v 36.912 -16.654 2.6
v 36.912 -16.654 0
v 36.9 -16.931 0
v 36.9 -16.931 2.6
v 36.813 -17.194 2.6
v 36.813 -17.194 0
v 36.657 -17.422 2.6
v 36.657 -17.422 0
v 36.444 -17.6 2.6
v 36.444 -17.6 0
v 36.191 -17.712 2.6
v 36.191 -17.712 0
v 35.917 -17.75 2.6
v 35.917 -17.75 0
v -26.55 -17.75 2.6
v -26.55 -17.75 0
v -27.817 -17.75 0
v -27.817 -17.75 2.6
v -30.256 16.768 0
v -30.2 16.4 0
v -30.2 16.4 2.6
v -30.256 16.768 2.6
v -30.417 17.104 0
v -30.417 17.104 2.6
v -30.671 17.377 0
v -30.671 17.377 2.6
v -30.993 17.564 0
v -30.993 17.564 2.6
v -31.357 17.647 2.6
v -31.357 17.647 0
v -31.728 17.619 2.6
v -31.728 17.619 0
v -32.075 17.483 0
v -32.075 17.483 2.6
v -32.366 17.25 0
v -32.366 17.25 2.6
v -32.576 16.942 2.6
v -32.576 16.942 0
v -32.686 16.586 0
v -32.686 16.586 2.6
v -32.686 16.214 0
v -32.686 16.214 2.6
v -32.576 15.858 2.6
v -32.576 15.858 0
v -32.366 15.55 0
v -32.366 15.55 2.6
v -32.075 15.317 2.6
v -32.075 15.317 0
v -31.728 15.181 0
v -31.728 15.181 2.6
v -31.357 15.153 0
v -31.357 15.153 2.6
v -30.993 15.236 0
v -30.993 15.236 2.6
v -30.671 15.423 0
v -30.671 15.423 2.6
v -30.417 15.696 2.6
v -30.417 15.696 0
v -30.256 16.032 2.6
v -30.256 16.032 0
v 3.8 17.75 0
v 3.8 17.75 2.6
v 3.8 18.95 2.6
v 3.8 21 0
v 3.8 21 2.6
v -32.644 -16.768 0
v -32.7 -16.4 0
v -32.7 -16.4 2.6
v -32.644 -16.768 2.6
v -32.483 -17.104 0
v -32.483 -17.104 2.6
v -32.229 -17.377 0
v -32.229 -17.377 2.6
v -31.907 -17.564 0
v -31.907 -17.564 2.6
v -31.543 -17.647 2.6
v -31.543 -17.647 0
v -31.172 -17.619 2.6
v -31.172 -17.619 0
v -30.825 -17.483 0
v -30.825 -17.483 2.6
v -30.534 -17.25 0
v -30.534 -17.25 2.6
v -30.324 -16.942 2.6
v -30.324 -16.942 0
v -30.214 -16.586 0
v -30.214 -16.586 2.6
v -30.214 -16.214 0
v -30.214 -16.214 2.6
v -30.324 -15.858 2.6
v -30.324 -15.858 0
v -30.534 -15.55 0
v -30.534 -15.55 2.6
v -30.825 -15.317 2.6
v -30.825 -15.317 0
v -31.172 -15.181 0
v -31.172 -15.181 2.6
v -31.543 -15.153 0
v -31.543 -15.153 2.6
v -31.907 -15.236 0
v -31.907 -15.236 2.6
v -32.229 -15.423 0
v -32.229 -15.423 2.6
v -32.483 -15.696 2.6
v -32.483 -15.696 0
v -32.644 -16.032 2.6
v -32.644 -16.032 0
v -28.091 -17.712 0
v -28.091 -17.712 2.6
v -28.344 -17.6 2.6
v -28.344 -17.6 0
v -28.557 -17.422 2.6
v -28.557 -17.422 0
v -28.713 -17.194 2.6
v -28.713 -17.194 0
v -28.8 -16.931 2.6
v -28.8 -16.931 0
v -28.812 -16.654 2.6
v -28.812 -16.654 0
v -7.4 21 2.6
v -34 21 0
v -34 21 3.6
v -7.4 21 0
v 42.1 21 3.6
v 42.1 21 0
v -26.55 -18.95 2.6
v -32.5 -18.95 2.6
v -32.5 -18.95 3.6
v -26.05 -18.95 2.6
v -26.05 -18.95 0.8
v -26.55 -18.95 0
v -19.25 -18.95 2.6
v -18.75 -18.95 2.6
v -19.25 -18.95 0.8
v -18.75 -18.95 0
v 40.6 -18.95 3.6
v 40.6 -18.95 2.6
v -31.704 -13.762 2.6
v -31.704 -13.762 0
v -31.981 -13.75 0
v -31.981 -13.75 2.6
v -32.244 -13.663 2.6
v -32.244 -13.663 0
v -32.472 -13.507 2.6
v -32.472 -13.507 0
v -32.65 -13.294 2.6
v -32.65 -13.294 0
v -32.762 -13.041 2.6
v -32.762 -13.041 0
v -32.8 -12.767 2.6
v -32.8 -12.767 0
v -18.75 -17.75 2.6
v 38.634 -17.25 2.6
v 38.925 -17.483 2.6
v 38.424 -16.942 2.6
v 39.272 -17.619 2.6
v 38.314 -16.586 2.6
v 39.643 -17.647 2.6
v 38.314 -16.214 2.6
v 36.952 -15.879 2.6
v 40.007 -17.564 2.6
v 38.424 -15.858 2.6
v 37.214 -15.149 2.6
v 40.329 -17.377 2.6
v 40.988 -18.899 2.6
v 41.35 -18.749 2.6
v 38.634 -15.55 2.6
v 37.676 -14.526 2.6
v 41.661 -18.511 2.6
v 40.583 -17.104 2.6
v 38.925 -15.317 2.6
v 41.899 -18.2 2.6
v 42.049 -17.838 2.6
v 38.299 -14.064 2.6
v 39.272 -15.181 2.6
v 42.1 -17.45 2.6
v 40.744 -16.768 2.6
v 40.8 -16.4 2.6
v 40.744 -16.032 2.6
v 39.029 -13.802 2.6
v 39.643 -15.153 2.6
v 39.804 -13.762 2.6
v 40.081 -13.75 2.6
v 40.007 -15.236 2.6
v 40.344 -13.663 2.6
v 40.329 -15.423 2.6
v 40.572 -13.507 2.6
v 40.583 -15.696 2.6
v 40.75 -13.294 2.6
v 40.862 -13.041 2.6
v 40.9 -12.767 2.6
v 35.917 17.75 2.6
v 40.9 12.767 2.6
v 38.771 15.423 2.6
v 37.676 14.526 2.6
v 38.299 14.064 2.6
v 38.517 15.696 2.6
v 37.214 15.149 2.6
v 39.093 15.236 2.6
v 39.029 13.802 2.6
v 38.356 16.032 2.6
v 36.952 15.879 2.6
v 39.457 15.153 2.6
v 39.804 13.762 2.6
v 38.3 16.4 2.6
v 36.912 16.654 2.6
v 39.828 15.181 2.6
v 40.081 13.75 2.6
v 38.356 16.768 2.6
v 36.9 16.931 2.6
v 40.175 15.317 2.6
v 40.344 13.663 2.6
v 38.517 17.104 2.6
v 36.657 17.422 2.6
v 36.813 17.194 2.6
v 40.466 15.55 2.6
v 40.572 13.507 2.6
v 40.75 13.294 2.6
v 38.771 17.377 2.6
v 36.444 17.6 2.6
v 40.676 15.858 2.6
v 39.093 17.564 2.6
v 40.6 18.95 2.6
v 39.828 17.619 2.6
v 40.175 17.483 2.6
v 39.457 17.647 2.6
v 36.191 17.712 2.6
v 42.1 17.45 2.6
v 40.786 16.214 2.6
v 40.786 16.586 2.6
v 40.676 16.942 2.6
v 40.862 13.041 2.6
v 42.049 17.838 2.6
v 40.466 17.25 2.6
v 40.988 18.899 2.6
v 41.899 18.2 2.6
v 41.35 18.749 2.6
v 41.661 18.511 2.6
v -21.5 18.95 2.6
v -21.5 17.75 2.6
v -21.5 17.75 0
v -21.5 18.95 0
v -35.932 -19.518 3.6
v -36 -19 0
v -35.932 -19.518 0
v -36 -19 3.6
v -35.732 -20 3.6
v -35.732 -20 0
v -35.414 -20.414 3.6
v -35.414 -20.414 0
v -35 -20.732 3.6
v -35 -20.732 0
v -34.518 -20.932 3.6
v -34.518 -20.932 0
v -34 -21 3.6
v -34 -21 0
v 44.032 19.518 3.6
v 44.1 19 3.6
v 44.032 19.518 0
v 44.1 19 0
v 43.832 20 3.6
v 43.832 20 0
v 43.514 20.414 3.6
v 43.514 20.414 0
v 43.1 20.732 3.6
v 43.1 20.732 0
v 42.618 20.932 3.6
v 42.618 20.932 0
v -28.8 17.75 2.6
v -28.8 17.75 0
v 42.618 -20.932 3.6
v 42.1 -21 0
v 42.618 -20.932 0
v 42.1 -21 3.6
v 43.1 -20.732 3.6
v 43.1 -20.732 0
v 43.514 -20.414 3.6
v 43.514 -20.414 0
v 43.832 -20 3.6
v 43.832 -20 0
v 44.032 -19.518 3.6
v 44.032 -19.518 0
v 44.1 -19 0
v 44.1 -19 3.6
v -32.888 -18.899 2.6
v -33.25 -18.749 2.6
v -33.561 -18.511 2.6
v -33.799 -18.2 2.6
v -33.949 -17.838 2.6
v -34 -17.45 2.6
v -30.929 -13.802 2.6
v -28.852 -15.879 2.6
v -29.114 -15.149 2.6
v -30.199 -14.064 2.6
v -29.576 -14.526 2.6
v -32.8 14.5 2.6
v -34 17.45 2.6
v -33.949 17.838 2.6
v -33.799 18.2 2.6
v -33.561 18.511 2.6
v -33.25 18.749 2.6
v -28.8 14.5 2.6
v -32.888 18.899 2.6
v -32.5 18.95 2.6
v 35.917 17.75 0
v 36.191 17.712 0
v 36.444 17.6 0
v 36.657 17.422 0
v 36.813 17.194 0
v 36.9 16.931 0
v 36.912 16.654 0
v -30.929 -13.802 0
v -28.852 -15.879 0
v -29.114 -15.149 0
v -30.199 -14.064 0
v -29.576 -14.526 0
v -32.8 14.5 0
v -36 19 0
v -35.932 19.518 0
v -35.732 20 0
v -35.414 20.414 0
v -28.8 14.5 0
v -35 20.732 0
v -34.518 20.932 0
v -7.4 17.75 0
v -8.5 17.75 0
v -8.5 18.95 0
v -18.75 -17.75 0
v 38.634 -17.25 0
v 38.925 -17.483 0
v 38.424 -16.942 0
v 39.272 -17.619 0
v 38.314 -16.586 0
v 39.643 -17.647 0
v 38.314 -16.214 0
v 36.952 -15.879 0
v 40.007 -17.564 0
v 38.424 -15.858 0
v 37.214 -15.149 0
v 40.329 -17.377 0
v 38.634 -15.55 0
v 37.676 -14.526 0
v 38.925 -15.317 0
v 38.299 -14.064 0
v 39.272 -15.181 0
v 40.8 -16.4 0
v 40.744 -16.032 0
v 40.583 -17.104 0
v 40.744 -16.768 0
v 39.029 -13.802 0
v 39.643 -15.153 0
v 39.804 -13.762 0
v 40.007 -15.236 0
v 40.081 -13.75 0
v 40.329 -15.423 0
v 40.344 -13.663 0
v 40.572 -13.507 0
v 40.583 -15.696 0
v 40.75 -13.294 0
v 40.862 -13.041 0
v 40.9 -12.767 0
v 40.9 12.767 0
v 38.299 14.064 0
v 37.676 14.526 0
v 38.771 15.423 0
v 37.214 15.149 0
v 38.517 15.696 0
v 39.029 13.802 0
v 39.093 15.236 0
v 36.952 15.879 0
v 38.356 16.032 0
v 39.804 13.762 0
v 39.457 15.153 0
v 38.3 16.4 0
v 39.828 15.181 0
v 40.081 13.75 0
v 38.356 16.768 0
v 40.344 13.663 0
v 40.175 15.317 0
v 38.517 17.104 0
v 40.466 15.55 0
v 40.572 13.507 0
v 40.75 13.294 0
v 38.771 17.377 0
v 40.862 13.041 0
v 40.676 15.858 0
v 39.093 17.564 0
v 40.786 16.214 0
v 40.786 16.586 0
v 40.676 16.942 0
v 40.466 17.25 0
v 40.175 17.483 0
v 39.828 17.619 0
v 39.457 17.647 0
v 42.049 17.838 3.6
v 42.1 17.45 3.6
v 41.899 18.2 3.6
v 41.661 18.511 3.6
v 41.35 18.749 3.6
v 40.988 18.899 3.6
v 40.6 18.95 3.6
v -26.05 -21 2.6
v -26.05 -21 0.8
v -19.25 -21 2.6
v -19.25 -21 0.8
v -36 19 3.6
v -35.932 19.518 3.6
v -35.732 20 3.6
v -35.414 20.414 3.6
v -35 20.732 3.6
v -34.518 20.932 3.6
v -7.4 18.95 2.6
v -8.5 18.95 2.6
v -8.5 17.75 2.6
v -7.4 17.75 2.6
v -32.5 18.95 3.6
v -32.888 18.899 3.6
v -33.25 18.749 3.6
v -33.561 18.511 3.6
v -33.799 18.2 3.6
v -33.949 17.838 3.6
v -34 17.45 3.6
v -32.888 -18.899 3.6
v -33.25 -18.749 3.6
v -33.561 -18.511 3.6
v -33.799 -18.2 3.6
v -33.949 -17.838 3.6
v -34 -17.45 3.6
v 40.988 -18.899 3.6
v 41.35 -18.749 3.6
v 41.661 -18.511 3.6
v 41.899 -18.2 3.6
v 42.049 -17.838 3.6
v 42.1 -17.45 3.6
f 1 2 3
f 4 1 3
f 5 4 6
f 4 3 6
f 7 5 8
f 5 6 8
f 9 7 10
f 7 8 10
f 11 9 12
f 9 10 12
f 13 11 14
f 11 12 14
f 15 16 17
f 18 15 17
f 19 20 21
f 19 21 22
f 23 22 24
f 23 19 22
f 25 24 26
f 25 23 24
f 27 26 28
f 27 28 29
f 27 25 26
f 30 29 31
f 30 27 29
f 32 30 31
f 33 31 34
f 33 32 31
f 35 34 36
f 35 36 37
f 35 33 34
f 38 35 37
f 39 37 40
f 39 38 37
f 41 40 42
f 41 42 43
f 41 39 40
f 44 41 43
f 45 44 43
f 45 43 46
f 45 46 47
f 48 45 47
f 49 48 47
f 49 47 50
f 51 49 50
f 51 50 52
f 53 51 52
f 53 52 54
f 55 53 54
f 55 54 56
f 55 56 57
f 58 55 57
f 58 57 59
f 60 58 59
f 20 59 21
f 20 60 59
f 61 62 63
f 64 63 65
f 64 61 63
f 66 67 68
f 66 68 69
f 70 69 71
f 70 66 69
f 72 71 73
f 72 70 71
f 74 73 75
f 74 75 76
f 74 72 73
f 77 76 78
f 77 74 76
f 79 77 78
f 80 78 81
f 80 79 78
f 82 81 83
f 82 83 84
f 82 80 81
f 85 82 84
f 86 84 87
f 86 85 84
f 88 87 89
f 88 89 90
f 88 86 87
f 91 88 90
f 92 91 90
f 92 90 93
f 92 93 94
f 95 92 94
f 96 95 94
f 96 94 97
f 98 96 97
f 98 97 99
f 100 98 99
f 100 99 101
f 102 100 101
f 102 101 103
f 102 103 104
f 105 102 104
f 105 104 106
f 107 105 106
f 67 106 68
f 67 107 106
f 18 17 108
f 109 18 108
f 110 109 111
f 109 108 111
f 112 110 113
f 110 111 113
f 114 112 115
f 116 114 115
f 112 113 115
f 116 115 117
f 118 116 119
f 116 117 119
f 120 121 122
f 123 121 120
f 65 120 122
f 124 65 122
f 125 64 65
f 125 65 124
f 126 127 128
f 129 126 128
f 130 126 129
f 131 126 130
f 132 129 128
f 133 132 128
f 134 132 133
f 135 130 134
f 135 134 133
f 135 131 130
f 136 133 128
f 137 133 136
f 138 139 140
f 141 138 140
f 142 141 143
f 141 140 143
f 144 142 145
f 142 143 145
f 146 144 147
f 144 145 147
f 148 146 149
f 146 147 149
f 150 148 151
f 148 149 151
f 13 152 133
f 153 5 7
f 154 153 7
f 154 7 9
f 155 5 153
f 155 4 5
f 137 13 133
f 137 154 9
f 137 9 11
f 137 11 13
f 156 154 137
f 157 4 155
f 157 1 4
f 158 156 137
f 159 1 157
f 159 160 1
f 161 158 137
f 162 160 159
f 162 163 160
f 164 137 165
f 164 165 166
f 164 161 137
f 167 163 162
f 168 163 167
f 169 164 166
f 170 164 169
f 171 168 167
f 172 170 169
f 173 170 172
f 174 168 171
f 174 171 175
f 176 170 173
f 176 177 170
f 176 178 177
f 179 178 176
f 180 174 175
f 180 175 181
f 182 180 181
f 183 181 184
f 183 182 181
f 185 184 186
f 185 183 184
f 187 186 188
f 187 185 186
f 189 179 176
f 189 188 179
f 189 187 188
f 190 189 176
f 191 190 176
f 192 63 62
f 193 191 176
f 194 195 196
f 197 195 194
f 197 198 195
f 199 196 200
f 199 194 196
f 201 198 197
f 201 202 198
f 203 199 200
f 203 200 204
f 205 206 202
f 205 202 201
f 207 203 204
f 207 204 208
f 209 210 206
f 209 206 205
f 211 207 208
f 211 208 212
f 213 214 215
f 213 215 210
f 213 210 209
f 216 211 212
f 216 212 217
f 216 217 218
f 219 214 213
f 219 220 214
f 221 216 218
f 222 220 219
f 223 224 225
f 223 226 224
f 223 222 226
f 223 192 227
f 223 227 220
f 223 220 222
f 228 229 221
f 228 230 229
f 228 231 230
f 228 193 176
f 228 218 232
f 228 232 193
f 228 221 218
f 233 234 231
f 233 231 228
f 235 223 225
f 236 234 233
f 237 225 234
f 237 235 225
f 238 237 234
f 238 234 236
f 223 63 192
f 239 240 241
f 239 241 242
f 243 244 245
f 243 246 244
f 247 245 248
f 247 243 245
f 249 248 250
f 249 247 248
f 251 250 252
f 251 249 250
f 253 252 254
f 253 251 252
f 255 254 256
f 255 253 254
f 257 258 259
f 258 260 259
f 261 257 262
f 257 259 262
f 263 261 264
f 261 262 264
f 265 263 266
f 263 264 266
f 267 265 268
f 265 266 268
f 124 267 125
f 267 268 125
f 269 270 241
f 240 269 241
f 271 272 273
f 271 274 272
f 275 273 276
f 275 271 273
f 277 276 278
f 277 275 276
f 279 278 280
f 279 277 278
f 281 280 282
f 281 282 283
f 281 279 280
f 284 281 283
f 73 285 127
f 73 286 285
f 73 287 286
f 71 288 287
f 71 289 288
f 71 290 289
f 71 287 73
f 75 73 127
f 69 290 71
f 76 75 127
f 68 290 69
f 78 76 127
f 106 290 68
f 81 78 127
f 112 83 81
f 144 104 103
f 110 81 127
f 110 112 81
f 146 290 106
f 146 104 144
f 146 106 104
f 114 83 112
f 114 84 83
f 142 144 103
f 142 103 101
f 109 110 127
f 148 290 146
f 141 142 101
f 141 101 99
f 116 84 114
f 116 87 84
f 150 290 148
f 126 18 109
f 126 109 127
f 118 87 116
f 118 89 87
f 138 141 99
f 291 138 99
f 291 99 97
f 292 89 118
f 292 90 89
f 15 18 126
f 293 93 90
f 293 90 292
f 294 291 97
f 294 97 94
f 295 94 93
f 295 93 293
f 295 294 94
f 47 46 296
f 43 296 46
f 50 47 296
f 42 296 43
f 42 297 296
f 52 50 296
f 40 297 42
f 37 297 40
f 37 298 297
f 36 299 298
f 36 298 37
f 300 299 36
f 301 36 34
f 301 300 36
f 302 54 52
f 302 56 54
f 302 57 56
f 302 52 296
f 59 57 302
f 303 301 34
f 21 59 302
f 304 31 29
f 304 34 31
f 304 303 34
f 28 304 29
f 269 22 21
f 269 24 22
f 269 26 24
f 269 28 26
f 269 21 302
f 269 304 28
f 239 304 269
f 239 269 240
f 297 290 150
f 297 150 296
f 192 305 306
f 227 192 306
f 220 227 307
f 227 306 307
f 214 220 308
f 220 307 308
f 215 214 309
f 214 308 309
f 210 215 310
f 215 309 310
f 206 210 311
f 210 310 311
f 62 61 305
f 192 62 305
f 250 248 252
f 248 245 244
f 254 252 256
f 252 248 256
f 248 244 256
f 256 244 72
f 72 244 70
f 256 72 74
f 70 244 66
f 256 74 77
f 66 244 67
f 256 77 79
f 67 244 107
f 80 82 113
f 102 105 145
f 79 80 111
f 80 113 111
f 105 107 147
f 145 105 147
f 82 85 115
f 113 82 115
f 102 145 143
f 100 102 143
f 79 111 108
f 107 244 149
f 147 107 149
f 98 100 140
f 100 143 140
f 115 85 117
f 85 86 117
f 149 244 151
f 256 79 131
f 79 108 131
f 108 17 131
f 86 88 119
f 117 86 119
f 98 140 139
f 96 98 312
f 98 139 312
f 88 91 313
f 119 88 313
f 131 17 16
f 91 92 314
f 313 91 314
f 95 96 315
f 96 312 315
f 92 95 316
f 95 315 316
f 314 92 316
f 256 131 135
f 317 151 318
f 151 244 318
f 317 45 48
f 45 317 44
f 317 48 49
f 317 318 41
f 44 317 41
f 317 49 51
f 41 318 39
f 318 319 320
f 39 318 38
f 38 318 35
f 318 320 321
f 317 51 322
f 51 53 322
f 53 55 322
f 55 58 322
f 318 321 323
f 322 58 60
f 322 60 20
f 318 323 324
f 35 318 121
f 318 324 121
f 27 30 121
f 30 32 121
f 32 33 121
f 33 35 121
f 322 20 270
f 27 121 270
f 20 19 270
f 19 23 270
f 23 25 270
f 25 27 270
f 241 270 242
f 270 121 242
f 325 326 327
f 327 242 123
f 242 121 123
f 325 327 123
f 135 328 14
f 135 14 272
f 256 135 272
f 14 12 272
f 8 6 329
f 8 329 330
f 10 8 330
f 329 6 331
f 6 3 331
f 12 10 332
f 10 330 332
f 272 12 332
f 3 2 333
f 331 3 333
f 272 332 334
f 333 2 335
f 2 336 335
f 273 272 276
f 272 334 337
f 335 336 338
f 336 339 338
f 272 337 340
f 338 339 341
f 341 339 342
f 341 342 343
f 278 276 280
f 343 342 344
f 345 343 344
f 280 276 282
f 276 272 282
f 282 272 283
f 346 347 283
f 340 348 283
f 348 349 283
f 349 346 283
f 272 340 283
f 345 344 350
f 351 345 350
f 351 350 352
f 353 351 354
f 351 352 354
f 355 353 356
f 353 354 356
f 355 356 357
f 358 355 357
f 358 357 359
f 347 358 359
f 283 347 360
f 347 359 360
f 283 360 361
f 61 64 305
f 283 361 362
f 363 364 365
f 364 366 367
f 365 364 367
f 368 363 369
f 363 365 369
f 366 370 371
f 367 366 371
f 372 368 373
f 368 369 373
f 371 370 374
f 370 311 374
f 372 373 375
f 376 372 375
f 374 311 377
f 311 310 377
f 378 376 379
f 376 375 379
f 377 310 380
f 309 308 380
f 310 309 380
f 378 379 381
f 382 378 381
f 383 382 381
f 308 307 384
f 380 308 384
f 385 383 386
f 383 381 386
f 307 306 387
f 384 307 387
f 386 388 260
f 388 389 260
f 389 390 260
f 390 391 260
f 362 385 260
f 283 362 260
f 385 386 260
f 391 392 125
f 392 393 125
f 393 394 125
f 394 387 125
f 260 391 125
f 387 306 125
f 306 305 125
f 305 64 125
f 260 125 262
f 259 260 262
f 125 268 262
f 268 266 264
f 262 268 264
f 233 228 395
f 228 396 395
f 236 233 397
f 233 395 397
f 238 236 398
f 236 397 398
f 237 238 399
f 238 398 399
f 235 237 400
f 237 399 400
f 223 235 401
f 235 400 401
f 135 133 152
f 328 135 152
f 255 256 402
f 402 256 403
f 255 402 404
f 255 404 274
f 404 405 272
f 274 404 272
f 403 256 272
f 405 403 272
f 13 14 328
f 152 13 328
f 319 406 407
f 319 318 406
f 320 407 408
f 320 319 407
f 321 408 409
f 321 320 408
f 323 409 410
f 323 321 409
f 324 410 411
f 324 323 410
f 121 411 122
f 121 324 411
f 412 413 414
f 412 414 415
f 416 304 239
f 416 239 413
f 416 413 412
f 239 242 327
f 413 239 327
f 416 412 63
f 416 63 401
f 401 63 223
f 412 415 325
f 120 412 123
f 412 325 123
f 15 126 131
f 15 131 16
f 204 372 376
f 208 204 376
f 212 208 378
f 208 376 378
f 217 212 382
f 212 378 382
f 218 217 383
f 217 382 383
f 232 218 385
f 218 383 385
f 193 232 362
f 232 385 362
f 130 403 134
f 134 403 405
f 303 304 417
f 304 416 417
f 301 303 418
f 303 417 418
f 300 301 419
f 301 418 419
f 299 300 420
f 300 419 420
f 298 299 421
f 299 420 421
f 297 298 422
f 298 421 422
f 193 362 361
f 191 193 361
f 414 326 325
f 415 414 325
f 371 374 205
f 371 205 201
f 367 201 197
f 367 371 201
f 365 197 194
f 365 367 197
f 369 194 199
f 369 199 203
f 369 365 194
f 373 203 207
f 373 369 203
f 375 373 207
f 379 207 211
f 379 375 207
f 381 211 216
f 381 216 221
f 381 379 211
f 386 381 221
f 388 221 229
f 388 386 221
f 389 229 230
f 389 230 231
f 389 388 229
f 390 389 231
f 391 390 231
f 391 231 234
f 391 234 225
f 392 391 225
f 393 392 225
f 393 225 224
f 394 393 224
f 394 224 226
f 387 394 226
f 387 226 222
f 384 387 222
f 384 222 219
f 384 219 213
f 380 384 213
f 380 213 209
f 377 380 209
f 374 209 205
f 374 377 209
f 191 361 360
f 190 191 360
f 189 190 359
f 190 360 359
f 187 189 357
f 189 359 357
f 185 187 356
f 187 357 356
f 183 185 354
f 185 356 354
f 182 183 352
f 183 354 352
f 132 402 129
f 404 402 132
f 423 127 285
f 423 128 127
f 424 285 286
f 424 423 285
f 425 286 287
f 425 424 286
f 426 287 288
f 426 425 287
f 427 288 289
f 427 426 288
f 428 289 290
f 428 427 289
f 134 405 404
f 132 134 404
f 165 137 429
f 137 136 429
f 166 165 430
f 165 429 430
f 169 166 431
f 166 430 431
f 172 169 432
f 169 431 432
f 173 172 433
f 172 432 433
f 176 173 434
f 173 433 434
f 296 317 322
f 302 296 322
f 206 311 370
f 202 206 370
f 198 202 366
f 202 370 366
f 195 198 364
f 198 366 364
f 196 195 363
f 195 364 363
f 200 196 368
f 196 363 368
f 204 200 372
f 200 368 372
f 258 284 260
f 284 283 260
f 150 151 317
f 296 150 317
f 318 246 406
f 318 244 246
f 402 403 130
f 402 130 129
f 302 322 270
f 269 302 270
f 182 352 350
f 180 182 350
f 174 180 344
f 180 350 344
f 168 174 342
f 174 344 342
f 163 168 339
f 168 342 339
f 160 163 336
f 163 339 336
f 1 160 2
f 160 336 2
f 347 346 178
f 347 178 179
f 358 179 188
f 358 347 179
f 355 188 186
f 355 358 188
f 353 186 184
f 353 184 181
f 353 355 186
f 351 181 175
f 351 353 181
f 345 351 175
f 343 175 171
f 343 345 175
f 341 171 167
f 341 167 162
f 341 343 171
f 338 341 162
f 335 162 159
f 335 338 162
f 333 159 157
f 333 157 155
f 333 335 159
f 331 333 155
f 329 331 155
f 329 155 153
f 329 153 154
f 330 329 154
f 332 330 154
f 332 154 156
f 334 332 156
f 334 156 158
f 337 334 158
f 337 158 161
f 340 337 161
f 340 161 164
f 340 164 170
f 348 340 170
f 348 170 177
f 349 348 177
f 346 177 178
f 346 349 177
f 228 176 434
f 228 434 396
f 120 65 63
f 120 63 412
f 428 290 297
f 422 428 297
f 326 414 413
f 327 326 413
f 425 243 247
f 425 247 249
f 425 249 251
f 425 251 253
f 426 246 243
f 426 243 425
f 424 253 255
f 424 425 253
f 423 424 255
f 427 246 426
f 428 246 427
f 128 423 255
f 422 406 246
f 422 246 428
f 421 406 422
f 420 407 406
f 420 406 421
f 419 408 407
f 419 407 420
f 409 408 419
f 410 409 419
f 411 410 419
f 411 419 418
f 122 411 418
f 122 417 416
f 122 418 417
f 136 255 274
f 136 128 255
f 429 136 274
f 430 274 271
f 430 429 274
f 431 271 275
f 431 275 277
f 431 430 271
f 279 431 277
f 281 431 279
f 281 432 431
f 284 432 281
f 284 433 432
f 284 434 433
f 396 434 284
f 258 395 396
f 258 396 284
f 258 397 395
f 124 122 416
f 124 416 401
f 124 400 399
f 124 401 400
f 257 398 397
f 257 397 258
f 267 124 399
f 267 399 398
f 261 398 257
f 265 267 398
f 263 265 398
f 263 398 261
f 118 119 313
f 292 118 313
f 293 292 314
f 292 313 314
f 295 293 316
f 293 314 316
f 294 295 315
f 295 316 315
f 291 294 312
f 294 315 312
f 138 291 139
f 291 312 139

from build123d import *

# Parameters (mm, degrees)
SKETCH1_W           = 80.1
SKETCH1_H           = 42
SKETCH1_R           = 1.25
BOSS_EXTRUDE1_DEPTH = 2.6
SKETCH2_W           = 80.1
SKETCH2_H           = 42
SKETCH2_W_2         = 76.1
SKETCH2_H_2         = 37.9
BOSS_EXTRUDE2_DEPTH = 1
FILLET1_R           = 2
FILLET2_R           = 1.5
SKETCH3_W           = 13
SKETCH3_H           = 5.85
CUT_EXTRUDE1_DEPTH  = 49.913903954
SKETCH4_W           = 7.8
SKETCH4_H           = 1.2
CUT_EXTRUDE2_DEPTH  = 49.913903954
SKETCH5_W           = 6.8
SKETCH5_H           = 1.8
CUT_USB_DEPTH       = 4
SKETCH6_W           = 11.2
SKETCH6_H           = 3.25
CUT_PILL_DEPTH      = 2.6


with BuildPart() as part:
    # Sketch1 → Boss-Extrude1 (new body)
    with BuildSketch(Plane.XY):
        with Locations((4.05, 0)):
            Rectangle(SKETCH1_W, SKETCH1_H)
        with Locations((39.55, -16.4)):
            Circle(SKETCH1_R, mode=Mode.SUBTRACT)
        with Locations(Location((-31.45, -16.4, 0), (0, 0, 180))):
            Circle(SKETCH1_R, mode=Mode.SUBTRACT)
        with Locations(Location((39.55, 16.4, 0), (0, 0, 180))):
            Circle(SKETCH1_R, mode=Mode.SUBTRACT)
        with Locations((-31.45, 16.4)):
            Circle(SKETCH1_R, mode=Mode.SUBTRACT)
        with BuildLine():
            Line((35.916819575, -17.75), (-27.816819575, -17.75))
            ThreePointArc((-27.816819575, -17.75), (-28.557052785, -17.422350202), (-28.812211472, -16.654109589))
            ThreePointArc((-28.812211472, -16.654109589), (-29.57616703, -14.52616703), (-31.704109589, -13.762211472))
            ThreePointArc((-31.704109589, -13.762211472), (-32.472350202, -13.507052785), (-32.8, -12.766819575))
            Line((-32.8, -12.766819575), (-32.8, 14.5))
            Line((-32.8, 14.5), (-28.8, 14.5))
            Line((-28.8, 14.5), (-28.8, 17.75))
            Line((-28.8, 17.75), (-27.816819575, 17.75))
            Line((-27.816819575, 17.75), (35.916819575, 17.75))
            ThreePointArc((35.916819575, 17.75), (36.657052785, 17.422350202), (36.912211472, 16.654109589))
            ThreePointArc((36.912211472, 16.654109589), (37.67616703, 14.52616703), (39.804109589, 13.762211472))
            ThreePointArc((39.804109589, 13.762211472), (40.572350202, 13.507052785), (40.9, 12.766819575))
            Line((40.9, 12.766819575), (40.9, -12.766819575))
            ThreePointArc((40.9, -12.766819575), (40.572350202, -13.507052785), (39.804109589, -13.762211472))
            ThreePointArc((39.804109589, -13.762211472), (37.67616703, -14.52616703), (36.912211472, -16.654109589))
            ThreePointArc((36.912211472, -16.654109589), (36.657052785, -17.422350202), (35.916819575, -17.75))
        make_face(mode=Mode.SUBTRACT)
    extrude(amount=BOSS_EXTRUDE1_DEPTH)

    # Sketch2 → Boss-Extrude2 (add)
    with BuildSketch(Plane.XY.offset(2.6)):
        with Locations((4.05, 0)):
            Rectangle(SKETCH2_W, SKETCH2_H)
        with Locations((4.05, 0)):
            Rectangle(SKETCH2_W_2, SKETCH2_H_2, mode=Mode.SUBTRACT)
    extrude(amount=BOSS_EXTRUDE2_DEPTH)

    # Fillet1
    fillet1_edges = [part.edges().sort_by_distance(p)[0] for p in [
        (44.1, -21, 1.8),
        (-36, -21, 1.8),
        (-36, 21, 1.8),
        (44.1, 21, 1.8),
    ]]
    fillet(fillet1_edges, radius=FILLET1_R)

    # Fillet2
    fillet2_edges = [part.edges().sort_by_distance(p)[0] for p in [
        (-34, -18.95, 3.1),
        (42.1, -18.95, 3.1),
        (42.1, 18.95, 3.1),
        (-34, 18.95, 3.1),
    ]]
    fillet(fillet2_edges, radius=FILLET2_R)

    # Sketch3 → Cut-Extrude1 (cut, through all)
    with BuildSketch(Plane.XY.offset(2.6)):
        with Locations((-15, 16.025)):
            Rectangle(SKETCH3_W, SKETCH3_H)
    extrude(amount=-CUT_EXTRUDE1_DEPTH, mode=Mode.SUBTRACT)

    # Sketch4 → Cut-Extrude2 (cut, through all)
    with BuildSketch(Plane.XY.offset(2.6)):
        with Locations((-22.65, -18.35)):
            Rectangle(SKETCH4_W, SKETCH4_H)
    extrude(amount=-CUT_EXTRUDE2_DEPTH, mode=Mode.SUBTRACT)

    # Sketch5 → Cut-USB (cut)
    with BuildSketch(Plane.XZ.offset(21)):
        with Locations((-22.65, 1.7)):
            Rectangle(SKETCH5_W, SKETCH5_H)
    extrude(amount=-CUT_USB_DEPTH, mode=Mode.SUBTRACT)

    # Sketch6 → Cut-Pill (cut)
    with BuildSketch(Plane(origin=(0, 0, 0), x_dir=(-1, 0, 0), z_dir=(0, 0, -1))):
        with Locations((1.8, 19.375)):
            Rectangle(SKETCH6_W, SKETCH6_H)
    extrude(amount=-CUT_PILL_DEPTH, mode=Mode.SUBTRACT)


solid = part.part
